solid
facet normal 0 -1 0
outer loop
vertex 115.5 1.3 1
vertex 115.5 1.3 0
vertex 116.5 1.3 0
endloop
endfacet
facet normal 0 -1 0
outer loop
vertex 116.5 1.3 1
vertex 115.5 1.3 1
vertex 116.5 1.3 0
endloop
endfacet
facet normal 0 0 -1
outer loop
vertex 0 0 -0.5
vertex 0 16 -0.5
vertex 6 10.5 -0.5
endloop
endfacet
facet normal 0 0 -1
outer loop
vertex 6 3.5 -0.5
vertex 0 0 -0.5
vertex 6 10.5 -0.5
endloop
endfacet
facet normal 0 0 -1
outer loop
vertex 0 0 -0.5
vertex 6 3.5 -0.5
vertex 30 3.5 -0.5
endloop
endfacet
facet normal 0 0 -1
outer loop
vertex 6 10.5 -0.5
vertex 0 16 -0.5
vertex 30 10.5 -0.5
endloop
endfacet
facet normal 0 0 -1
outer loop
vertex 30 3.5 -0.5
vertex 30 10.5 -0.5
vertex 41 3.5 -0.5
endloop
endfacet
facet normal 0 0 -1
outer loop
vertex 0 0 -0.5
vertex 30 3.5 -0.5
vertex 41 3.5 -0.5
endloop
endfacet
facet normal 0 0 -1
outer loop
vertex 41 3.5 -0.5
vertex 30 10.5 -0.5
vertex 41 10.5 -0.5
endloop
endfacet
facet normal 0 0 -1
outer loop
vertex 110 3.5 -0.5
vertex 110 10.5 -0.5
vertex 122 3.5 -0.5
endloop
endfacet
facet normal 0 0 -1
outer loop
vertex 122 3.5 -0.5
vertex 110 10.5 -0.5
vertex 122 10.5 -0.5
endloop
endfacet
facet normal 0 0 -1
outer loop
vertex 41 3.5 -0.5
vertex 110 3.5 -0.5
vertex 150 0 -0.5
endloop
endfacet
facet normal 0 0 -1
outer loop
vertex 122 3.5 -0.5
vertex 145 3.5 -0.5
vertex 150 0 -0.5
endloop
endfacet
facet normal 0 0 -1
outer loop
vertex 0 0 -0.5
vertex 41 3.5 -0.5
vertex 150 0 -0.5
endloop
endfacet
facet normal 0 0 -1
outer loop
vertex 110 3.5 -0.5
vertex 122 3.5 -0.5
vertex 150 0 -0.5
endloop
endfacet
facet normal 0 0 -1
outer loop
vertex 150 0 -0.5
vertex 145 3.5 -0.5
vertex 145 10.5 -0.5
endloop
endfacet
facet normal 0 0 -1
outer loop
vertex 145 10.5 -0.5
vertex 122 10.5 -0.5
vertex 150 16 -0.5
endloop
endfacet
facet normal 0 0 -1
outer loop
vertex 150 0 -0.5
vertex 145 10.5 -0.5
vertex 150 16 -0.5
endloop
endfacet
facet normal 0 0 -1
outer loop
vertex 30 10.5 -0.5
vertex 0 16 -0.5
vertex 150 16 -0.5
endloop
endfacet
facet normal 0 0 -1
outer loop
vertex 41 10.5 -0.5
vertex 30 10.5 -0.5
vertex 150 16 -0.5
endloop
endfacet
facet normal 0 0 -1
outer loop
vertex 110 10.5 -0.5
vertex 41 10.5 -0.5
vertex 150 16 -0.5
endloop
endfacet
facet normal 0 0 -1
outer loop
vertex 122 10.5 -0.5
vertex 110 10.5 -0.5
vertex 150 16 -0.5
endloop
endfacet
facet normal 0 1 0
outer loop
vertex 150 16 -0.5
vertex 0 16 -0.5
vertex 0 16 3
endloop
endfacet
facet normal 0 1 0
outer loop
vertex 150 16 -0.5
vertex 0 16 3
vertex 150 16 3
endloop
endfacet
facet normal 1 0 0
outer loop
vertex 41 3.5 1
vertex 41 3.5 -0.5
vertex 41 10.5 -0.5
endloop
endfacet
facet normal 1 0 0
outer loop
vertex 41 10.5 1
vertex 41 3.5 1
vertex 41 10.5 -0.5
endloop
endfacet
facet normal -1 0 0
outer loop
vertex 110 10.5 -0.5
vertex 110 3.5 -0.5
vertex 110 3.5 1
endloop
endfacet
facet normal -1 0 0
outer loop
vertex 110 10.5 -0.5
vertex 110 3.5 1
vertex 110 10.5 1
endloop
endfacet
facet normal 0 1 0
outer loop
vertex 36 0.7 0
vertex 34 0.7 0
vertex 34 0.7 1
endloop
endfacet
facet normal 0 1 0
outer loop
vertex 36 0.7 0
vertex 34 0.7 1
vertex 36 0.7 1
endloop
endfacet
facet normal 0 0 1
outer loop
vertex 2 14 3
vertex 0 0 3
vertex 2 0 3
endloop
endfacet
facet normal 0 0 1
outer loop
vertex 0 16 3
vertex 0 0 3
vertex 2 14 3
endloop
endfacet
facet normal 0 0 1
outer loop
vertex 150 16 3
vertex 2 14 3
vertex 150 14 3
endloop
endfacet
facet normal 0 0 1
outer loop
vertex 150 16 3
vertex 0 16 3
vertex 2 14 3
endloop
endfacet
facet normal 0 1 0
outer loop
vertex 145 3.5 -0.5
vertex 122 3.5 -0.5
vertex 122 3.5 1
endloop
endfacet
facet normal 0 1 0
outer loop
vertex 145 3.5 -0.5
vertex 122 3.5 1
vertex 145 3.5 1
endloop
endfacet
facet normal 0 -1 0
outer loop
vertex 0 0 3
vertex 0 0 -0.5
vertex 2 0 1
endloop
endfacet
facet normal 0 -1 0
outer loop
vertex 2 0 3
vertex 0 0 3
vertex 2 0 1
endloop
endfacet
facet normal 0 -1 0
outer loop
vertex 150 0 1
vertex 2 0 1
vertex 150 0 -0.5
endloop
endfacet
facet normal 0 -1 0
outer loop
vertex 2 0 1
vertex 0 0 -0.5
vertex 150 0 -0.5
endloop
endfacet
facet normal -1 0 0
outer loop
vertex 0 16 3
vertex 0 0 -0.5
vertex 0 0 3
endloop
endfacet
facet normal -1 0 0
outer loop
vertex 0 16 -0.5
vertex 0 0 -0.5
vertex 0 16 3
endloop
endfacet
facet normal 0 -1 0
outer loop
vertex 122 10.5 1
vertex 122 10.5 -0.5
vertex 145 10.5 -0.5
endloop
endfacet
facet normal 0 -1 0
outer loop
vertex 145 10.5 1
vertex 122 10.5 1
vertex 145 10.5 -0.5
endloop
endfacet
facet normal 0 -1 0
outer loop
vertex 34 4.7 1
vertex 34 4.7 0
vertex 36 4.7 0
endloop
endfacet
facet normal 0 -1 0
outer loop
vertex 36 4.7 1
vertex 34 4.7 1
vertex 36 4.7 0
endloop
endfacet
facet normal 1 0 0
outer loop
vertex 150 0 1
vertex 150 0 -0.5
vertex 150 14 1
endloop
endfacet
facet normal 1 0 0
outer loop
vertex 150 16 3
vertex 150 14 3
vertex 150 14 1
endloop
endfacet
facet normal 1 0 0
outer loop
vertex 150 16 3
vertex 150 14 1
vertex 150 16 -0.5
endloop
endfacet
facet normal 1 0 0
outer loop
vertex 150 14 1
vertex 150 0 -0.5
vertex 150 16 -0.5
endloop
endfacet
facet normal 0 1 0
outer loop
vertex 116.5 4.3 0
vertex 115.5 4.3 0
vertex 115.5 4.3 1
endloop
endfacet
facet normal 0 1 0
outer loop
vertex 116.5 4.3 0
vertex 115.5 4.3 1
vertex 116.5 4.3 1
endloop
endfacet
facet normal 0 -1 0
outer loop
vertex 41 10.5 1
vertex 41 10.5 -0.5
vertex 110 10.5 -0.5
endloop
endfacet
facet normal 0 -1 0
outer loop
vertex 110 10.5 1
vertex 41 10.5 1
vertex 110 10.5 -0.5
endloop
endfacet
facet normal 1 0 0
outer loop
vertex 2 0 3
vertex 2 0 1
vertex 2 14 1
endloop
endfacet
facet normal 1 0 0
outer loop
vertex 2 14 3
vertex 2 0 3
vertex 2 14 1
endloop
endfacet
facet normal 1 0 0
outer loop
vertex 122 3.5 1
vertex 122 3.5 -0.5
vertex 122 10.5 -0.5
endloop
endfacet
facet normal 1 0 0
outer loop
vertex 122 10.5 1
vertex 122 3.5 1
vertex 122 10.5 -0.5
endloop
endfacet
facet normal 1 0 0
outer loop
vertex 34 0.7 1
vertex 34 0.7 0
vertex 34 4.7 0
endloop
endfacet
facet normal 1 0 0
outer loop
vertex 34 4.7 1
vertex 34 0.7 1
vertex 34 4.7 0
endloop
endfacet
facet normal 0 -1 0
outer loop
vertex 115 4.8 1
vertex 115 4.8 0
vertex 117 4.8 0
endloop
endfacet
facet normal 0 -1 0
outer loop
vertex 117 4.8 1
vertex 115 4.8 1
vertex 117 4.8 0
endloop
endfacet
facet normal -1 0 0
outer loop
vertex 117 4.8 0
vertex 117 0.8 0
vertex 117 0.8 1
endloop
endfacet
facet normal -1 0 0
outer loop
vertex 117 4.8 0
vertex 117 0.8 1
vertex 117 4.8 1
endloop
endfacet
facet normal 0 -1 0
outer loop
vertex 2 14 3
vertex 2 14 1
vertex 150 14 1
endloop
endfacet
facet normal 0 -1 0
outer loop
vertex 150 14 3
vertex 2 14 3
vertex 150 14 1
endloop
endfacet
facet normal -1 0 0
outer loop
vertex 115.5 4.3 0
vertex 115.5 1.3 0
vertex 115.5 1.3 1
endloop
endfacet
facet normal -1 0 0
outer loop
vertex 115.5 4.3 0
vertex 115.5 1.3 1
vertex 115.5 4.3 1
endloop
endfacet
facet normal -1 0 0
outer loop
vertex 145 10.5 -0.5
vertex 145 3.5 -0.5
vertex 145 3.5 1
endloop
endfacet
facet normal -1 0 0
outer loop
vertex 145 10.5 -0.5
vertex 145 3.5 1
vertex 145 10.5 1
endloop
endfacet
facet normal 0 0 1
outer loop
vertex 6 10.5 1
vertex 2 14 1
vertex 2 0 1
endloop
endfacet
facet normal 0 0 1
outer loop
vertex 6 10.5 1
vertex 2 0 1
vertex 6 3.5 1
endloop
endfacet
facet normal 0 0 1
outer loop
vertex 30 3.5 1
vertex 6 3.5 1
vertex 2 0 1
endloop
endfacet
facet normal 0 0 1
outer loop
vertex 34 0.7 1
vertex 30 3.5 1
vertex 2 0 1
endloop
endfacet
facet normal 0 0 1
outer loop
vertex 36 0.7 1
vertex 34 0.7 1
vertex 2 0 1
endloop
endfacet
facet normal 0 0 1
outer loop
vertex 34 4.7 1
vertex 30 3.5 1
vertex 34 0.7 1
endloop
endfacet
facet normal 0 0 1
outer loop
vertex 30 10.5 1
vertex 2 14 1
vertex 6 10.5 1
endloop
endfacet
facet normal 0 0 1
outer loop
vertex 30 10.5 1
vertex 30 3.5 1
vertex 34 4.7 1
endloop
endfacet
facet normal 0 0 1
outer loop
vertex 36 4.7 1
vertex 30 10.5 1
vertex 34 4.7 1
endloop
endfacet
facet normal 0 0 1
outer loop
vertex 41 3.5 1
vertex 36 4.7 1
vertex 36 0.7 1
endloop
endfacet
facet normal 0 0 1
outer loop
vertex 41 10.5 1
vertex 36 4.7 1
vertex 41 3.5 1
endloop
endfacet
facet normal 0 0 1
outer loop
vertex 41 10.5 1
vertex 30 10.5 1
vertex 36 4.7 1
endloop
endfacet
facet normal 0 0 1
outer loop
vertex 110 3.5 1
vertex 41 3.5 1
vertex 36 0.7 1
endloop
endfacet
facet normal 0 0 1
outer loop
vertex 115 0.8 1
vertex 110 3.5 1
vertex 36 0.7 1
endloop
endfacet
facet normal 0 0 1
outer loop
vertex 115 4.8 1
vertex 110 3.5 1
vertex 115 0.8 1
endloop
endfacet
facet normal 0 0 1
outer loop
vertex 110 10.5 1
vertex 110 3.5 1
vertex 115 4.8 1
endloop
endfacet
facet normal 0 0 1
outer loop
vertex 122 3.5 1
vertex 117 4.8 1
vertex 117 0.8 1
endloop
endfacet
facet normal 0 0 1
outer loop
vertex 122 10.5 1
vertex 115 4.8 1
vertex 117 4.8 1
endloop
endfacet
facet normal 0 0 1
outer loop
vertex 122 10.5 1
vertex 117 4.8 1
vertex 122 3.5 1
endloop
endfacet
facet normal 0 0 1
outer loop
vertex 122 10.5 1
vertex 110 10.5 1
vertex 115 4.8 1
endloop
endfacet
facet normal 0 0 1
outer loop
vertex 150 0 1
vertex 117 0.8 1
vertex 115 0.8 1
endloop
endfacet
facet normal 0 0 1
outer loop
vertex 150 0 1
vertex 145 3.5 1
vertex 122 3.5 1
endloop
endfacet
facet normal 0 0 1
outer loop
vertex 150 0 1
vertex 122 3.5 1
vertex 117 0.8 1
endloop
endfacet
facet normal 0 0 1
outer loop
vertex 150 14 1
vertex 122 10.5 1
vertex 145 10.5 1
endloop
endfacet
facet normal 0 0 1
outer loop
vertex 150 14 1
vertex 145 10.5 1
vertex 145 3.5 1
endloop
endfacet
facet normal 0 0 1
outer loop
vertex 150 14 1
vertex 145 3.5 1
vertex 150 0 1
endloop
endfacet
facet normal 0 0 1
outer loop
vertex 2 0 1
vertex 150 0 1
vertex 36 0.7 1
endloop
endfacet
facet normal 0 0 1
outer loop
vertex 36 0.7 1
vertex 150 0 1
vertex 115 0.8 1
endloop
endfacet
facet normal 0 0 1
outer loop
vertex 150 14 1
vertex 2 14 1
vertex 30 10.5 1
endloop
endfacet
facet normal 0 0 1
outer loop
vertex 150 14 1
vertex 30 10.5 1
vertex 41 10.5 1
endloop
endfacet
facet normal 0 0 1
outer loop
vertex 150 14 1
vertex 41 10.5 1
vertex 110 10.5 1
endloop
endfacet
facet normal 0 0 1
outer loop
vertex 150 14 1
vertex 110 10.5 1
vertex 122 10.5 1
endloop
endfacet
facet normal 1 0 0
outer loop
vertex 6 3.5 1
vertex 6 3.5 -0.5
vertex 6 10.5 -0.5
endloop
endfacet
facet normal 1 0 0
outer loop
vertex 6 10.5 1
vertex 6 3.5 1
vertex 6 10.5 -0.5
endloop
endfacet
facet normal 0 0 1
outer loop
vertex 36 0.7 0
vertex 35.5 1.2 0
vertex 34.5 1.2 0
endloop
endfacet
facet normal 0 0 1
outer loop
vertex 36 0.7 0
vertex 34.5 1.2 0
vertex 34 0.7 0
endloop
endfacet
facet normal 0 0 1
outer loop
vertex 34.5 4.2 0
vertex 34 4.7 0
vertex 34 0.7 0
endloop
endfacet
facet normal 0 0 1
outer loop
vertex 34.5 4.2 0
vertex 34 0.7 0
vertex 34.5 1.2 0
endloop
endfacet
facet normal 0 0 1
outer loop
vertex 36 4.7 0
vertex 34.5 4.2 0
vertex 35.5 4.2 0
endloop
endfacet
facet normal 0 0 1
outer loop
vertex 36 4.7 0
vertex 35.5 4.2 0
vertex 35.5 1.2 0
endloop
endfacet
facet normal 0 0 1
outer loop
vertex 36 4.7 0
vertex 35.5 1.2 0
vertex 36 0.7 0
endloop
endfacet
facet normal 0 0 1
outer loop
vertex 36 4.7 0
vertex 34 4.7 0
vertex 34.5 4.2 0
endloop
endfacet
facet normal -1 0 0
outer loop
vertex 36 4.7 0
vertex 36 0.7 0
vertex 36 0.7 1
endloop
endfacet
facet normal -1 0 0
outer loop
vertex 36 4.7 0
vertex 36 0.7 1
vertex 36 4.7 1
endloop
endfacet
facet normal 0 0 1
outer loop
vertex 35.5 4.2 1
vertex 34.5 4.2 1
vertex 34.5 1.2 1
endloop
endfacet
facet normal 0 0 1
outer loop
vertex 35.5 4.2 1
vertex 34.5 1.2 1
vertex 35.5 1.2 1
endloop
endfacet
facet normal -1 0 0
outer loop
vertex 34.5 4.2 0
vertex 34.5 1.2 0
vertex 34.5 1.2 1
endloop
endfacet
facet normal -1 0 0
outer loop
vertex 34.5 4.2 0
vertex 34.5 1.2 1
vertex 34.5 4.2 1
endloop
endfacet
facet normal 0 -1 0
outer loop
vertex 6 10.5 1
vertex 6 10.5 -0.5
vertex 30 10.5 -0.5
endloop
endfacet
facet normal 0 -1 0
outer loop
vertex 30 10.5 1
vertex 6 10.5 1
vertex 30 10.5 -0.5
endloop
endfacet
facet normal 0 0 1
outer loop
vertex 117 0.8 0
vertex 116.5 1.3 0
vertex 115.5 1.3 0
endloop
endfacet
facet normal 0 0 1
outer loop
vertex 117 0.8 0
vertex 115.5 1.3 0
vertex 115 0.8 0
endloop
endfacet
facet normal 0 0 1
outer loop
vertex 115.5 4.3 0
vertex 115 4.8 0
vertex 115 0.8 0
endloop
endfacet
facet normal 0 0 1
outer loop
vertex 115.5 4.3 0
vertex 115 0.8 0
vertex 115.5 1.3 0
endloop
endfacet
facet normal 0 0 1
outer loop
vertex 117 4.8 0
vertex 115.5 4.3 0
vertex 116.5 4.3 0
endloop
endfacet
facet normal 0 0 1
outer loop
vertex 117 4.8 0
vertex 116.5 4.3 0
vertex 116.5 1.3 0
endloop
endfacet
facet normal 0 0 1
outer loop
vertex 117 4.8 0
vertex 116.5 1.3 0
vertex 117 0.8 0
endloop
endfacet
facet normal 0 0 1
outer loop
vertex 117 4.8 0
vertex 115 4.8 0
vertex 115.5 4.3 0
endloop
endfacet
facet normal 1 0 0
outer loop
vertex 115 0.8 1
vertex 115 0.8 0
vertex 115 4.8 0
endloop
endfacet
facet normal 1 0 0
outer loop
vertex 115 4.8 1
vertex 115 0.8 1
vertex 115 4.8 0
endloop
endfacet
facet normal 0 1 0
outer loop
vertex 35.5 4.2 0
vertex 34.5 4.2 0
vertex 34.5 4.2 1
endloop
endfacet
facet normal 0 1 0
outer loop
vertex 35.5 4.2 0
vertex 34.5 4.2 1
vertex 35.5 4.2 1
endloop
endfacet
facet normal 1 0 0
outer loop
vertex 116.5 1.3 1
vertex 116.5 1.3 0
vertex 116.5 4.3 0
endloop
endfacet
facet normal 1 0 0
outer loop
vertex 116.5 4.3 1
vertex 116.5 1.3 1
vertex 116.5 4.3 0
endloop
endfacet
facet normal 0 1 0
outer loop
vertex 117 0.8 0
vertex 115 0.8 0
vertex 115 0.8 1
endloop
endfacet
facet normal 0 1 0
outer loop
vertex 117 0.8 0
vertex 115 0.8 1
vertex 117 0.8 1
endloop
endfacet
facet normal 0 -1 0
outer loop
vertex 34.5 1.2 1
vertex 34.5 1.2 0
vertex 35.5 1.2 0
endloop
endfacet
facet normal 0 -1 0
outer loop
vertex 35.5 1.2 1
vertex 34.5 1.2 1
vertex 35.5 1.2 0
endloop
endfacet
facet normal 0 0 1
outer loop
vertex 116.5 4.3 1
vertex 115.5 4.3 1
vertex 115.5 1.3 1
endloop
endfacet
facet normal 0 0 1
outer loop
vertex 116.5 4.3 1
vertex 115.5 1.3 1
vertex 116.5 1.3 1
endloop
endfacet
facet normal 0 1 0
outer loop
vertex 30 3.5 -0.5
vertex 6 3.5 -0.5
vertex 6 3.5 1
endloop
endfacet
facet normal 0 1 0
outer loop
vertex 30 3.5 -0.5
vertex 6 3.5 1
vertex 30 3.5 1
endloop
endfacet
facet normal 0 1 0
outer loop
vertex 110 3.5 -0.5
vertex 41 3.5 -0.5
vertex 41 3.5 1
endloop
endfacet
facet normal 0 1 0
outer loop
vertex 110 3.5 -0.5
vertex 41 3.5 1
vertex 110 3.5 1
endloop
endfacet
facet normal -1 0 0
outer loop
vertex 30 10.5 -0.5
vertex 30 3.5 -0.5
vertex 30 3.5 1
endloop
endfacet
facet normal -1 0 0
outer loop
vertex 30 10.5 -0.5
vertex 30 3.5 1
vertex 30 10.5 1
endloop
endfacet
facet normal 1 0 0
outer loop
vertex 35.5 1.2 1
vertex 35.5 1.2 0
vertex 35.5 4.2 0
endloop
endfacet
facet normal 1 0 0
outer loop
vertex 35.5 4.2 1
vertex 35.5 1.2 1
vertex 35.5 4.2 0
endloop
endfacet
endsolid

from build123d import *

# Parameters (mm, degrees)
BOX006_W     = 23
BOX006_H     = 7
BOX006_DEPTH = 10
BOX005_W     = 69
BOX005_H     = 7
BOX005_DEPTH = 10
BOX004_W     = 24
BOX004_H     = 7
BOX004_DEPTH = 10
BOX003_W     = 2
BOX003_H     = 4
BOX003_DEPTH = 10
BOX002_W     = 2
BOX002_H     = 4
BOX002_DEPTH = 10
BOX001_W     = 148
BOX001_H     = 14
BOX001_DEPTH = 2
BOX_W        = 150
BOX_H        = 16
BOX_DEPTH    = 3
BOX011_W     = 69
BOX011_H     = 7
BOX011_DEPTH = 10
BOX012_W     = 23
BOX012_H     = 7
BOX012_DEPTH = 10
BOX010_W     = 24
BOX010_H     = 7
BOX010_DEPTH = 10
BOX008_W     = 1
BOX008_H     = 3
BOX008_DEPTH = 1
BOX007_W     = 1
BOX007_H     = 3
BOX007_DEPTH = 1
BOX009_W     = 150
BOX009_H     = 16
BOX009_DEPTH = 0.5


with BuildPart() as cube006:
    # Box006 → Box006 (new body)
    with BuildSketch(Plane(origin=(122, 3.5, -3), x_dir=(1, 0, 0), z_dir=(0, 0, 1))):
        with Locations((11.5, 3.5)):
            Rectangle(BOX006_W, BOX006_H)
    extrude(amount=BOX006_DEPTH)


with BuildPart() as cube005:
    # Box005 → Box005 (new body)
    with BuildSketch(Plane(origin=(41, 3.5, -3), x_dir=(1, 0, 0), z_dir=(0, 0, 1))):
        with Locations((34.5, 3.5)):
            Rectangle(BOX005_W, BOX005_H)
    extrude(amount=BOX005_DEPTH)


with BuildPart() as cube004:
    # Box004 → Box004 (new body)
    with BuildSketch(Plane(origin=(6, 3.5, -3), x_dir=(1, 0, 0), z_dir=(0, 0, 1))):
        with Locations((12, 3.5)):
            Rectangle(BOX004_W, BOX004_H)
    extrude(amount=BOX004_DEPTH)


with BuildPart() as cube003:
    # Box003 → Box003 (new body)
    with BuildSketch(Plane(origin=(115, 0.8, -5), x_dir=(1, 0, 0), z_dir=(0, 0, 1))):
        with Locations((1, 2)):
            Rectangle(BOX003_W, BOX003_H)
    extrude(amount=BOX003_DEPTH)


with BuildPart() as cube002:
    # Box002 → Box002 (new body)
    with BuildSketch(Plane(origin=(34, 0.7, -5), x_dir=(1, 0, 0), z_dir=(0, 0, 1))):
        with Locations((1, 2)):
            Rectangle(BOX002_W, BOX002_H)
    extrude(amount=BOX002_DEPTH)


with BuildPart() as cube001:
    # Box001 → Box001 (new body)
    with BuildSketch(Plane(origin=(2, 0, 1), x_dir=(1, 0, 0), z_dir=(0, 0, 1))):
        with Locations((74, 7)):
            Rectangle(BOX001_W, BOX001_H)
    extrude(amount=BOX001_DEPTH)


with BuildPart() as cut005:
    # Box → Box (new body)
    with BuildSketch(Plane.XY):
        with Locations((75, 8)):
            Rectangle(BOX_W, BOX_H)
    extrude(amount=BOX_DEPTH)

    # Cut: cut Cube001
    add(cube001.part, mode=Mode.SUBTRACT)

    # Cut001: cut Cube002
    add(cube002.part, mode=Mode.SUBTRACT)

    # Cut002: cut Cube003
    add(cube003.part, mode=Mode.SUBTRACT)

    # Cut003: cut Cube004
    add(cube004.part, mode=Mode.SUBTRACT)

    # Cut004: cut Cube005
    add(cube005.part, mode=Mode.SUBTRACT)

    # Cut005: cut Cube006
    add(cube006.part, mode=Mode.SUBTRACT)


with BuildPart() as cube011:
    # Box011 → Box011 (new body)
    with BuildSketch(Plane(origin=(41, 3.5, -3), x_dir=(1, 0, 0), z_dir=(0, 0, 1))):
        with Locations((34.5, 3.5)):
            Rectangle(BOX011_W, BOX011_H)
    extrude(amount=BOX011_DEPTH)


with BuildPart() as cube012:
    # Box012 → Box012 (new body)
    with BuildSketch(Plane(origin=(122, 3.5, -3), x_dir=(1, 0, 0), z_dir=(0, 0, 1))):
        with Locations((11.5, 3.5)):
            Rectangle(BOX012_W, BOX012_H)
    extrude(amount=BOX012_DEPTH)


with BuildPart() as cube010:
    # Box010 → Box010 (new body)
    with BuildSketch(Plane(origin=(6, 3.5, -3), x_dir=(1, 0, 0), z_dir=(0, 0, 1))):
        with Locations((12, 3.5)):
            Rectangle(BOX010_W, BOX010_H)
    extrude(amount=BOX010_DEPTH)


with BuildPart() as cube008:
    # Box008 → Box008 (new body)
    with BuildSketch(Plane(origin=(115.5, 1.3, 0), x_dir=(1, 0, 0), z_dir=(0, 0, 1))):
        with Locations((0.5, 1.5)):
            Rectangle(BOX008_W, BOX008_H)
    extrude(amount=BOX008_DEPTH)


with BuildPart() as cube007:
    # Box007 → Box007 (new body)
    with BuildSketch(Plane(origin=(34.5, 1.2, 0), x_dir=(1, 0, 0), z_dir=(0, 0, 1))):
        with Locations((0.5, 1.5)):
            Rectangle(BOX007_W, BOX007_H)
    extrude(amount=BOX007_DEPTH)


with BuildPart() as fusion001:
    # Box009 → Box009 (new body)
    with BuildSketch(Plane.XY.offset(-0.5)):
        with Locations((75, 8)):
            Rectangle(BOX009_W, BOX009_H)
    extrude(amount=BOX009_DEPTH)

    # Fusion: union Cube008, Cube007
    add(cube008.part)
    add(cube007.part)

    # Cut006: cut Cube010
    add(cube010.part, mode=Mode.SUBTRACT)

    # Cut007: cut Cube012
    add(cube012.part, mode=Mode.SUBTRACT)

    # Cut008: cut Cube011
    add(cube011.part, mode=Mode.SUBTRACT)

    # Fusion001: union Cut005
    add(cut005.part)


solid = fusion001.part
